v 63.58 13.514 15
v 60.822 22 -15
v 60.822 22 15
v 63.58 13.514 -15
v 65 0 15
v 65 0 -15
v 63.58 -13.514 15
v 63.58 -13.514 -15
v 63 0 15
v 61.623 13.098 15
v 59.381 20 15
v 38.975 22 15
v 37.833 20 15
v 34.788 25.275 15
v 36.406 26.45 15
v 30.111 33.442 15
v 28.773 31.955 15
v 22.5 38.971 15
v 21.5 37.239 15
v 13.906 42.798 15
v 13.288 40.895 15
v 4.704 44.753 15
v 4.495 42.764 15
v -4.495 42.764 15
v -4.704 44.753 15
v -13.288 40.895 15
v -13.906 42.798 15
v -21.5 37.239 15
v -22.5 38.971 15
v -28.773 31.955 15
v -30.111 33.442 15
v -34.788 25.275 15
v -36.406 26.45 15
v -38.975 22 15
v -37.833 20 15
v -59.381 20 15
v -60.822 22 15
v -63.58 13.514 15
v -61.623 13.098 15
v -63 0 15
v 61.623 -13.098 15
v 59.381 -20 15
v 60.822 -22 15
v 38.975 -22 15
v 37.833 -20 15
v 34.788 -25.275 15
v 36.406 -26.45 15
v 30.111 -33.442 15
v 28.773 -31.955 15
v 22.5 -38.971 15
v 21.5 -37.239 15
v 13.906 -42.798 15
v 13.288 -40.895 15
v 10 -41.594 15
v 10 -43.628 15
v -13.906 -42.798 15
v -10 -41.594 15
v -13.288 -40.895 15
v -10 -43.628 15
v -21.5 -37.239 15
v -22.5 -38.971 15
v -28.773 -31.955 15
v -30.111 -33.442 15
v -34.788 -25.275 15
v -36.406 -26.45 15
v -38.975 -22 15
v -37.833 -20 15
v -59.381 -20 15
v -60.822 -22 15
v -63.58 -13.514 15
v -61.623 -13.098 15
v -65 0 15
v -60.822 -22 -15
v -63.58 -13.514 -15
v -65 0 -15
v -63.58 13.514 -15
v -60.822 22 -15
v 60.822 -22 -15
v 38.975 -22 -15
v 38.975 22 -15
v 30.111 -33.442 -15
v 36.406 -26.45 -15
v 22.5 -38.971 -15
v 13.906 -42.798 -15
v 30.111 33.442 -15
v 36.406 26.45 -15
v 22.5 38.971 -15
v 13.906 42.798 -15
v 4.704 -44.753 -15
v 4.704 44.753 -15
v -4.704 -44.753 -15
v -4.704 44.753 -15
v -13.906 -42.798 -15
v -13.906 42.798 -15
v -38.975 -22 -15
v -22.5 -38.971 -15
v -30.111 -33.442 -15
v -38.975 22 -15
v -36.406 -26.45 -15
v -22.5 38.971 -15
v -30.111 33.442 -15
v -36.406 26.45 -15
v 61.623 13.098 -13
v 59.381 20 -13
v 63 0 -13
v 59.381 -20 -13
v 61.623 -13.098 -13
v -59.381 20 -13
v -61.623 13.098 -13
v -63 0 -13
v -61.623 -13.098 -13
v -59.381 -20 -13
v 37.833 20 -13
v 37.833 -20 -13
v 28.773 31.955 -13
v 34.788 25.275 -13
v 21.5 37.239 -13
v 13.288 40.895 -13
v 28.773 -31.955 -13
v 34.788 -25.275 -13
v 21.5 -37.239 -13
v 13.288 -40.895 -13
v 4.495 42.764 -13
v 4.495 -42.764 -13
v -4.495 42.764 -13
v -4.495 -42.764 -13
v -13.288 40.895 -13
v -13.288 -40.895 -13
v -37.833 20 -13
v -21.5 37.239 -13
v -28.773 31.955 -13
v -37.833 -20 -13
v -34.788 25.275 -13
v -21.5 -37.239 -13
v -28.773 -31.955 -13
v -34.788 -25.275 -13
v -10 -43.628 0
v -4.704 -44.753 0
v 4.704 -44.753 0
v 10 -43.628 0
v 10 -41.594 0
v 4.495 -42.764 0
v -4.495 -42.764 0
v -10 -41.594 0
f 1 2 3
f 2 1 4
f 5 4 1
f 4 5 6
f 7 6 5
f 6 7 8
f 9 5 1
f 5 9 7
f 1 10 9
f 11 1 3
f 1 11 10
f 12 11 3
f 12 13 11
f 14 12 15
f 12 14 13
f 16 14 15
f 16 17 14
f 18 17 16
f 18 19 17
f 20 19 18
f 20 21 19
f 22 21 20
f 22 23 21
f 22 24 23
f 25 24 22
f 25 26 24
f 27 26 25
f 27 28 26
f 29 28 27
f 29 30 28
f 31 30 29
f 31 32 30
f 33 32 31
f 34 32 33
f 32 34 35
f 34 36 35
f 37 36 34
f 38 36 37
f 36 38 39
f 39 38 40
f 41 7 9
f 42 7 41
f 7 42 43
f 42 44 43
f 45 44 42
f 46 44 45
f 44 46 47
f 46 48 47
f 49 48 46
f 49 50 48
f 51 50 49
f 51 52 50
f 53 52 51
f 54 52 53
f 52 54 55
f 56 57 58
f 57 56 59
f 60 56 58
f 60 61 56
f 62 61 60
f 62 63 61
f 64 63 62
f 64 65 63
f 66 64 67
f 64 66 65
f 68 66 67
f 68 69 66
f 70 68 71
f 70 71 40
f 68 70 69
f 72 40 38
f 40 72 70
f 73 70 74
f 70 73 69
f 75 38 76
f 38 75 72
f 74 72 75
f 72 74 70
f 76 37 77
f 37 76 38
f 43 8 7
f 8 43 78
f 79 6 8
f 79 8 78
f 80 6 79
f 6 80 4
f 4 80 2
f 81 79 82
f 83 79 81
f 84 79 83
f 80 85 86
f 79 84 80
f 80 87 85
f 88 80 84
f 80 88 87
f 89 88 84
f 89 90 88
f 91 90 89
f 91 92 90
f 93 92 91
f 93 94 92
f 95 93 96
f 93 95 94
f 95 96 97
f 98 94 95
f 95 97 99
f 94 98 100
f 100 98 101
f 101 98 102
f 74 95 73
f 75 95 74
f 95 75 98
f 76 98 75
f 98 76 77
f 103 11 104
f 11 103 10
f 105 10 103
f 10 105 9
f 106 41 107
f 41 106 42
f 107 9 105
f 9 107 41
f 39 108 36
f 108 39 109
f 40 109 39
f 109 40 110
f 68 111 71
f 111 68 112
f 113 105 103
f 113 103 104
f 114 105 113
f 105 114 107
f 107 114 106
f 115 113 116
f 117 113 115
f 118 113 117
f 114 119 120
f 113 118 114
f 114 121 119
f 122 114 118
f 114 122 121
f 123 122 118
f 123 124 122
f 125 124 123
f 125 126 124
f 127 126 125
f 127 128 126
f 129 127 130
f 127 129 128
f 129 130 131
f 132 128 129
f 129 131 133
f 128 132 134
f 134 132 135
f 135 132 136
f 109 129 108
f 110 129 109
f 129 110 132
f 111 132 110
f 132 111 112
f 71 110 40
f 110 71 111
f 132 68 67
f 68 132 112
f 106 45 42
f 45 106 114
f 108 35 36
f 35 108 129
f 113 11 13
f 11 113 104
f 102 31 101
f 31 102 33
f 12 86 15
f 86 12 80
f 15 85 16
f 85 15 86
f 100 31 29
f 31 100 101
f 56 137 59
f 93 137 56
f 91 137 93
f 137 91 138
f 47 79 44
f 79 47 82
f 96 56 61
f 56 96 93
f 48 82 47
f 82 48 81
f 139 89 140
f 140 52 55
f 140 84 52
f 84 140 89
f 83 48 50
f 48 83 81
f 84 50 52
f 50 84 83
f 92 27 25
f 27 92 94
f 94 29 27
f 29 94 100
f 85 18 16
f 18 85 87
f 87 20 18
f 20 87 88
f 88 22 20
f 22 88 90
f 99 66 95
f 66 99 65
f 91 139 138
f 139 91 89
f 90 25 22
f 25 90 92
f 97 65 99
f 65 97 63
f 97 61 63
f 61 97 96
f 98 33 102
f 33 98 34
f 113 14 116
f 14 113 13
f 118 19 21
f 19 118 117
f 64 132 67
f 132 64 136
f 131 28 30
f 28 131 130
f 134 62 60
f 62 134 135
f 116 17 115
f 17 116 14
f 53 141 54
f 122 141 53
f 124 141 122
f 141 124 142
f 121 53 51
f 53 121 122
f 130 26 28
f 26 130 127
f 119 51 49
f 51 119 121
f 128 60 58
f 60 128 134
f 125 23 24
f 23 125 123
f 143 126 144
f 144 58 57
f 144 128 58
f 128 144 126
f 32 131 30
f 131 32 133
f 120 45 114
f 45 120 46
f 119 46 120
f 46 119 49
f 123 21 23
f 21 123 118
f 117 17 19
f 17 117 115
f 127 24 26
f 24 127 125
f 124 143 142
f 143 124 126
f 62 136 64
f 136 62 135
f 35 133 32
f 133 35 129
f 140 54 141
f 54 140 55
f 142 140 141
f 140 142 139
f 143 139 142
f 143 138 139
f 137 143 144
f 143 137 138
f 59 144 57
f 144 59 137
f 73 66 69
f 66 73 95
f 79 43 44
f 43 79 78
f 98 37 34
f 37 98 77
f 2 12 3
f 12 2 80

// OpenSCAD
module cilindro(r,h,sp) {
difference() {
cylinder(r=r, h=h, center=true);
translate([0, 0, 2])
cylinder(r=r-sp, h=h, center=true);
}
}

module part1(r1,r2) {
difference() {
  cilindro(r1,h,sp);
  translate([-70, -150, -20])
  cube(size=[140, 130, 60], center=false);
  translate([-70, 20, -20])
  cube(size=[140, 130, 60], center=false);
}

difference() {
  cilindro(r2,h,sp);
  translate([-45, -20, -13])
  cube(size=[90, 40, 60], center=false);
  translate([-10, -150, 0])
  cube(size=[20, 150, 20], center=false);
}
}

r1=65;
r2=45;
h=30;
sp=2;

//projection(cut=true)
part1(r1,r2);     // pezzo con 4 pareti tonde


intersection() { //parete sud
difference() {
translate([-70, -22, -15])
cube(size=[140, 2, 30], center=false);
translate([0, 0, 2])
cylinder(r=r2-sp, h=h, center=true);
}
cylinder(r=r1, h=h, center=true);
}

intersection() { //parete nord
difference() {
translate([-70, 20, -15])
cube(size=[140, 2, 30], center=false);
translate([0, 0, 2])
cylinder(r=r2-sp, h=h, center=true);
}
cylinder(r=r1, h=h, center=true);
}
